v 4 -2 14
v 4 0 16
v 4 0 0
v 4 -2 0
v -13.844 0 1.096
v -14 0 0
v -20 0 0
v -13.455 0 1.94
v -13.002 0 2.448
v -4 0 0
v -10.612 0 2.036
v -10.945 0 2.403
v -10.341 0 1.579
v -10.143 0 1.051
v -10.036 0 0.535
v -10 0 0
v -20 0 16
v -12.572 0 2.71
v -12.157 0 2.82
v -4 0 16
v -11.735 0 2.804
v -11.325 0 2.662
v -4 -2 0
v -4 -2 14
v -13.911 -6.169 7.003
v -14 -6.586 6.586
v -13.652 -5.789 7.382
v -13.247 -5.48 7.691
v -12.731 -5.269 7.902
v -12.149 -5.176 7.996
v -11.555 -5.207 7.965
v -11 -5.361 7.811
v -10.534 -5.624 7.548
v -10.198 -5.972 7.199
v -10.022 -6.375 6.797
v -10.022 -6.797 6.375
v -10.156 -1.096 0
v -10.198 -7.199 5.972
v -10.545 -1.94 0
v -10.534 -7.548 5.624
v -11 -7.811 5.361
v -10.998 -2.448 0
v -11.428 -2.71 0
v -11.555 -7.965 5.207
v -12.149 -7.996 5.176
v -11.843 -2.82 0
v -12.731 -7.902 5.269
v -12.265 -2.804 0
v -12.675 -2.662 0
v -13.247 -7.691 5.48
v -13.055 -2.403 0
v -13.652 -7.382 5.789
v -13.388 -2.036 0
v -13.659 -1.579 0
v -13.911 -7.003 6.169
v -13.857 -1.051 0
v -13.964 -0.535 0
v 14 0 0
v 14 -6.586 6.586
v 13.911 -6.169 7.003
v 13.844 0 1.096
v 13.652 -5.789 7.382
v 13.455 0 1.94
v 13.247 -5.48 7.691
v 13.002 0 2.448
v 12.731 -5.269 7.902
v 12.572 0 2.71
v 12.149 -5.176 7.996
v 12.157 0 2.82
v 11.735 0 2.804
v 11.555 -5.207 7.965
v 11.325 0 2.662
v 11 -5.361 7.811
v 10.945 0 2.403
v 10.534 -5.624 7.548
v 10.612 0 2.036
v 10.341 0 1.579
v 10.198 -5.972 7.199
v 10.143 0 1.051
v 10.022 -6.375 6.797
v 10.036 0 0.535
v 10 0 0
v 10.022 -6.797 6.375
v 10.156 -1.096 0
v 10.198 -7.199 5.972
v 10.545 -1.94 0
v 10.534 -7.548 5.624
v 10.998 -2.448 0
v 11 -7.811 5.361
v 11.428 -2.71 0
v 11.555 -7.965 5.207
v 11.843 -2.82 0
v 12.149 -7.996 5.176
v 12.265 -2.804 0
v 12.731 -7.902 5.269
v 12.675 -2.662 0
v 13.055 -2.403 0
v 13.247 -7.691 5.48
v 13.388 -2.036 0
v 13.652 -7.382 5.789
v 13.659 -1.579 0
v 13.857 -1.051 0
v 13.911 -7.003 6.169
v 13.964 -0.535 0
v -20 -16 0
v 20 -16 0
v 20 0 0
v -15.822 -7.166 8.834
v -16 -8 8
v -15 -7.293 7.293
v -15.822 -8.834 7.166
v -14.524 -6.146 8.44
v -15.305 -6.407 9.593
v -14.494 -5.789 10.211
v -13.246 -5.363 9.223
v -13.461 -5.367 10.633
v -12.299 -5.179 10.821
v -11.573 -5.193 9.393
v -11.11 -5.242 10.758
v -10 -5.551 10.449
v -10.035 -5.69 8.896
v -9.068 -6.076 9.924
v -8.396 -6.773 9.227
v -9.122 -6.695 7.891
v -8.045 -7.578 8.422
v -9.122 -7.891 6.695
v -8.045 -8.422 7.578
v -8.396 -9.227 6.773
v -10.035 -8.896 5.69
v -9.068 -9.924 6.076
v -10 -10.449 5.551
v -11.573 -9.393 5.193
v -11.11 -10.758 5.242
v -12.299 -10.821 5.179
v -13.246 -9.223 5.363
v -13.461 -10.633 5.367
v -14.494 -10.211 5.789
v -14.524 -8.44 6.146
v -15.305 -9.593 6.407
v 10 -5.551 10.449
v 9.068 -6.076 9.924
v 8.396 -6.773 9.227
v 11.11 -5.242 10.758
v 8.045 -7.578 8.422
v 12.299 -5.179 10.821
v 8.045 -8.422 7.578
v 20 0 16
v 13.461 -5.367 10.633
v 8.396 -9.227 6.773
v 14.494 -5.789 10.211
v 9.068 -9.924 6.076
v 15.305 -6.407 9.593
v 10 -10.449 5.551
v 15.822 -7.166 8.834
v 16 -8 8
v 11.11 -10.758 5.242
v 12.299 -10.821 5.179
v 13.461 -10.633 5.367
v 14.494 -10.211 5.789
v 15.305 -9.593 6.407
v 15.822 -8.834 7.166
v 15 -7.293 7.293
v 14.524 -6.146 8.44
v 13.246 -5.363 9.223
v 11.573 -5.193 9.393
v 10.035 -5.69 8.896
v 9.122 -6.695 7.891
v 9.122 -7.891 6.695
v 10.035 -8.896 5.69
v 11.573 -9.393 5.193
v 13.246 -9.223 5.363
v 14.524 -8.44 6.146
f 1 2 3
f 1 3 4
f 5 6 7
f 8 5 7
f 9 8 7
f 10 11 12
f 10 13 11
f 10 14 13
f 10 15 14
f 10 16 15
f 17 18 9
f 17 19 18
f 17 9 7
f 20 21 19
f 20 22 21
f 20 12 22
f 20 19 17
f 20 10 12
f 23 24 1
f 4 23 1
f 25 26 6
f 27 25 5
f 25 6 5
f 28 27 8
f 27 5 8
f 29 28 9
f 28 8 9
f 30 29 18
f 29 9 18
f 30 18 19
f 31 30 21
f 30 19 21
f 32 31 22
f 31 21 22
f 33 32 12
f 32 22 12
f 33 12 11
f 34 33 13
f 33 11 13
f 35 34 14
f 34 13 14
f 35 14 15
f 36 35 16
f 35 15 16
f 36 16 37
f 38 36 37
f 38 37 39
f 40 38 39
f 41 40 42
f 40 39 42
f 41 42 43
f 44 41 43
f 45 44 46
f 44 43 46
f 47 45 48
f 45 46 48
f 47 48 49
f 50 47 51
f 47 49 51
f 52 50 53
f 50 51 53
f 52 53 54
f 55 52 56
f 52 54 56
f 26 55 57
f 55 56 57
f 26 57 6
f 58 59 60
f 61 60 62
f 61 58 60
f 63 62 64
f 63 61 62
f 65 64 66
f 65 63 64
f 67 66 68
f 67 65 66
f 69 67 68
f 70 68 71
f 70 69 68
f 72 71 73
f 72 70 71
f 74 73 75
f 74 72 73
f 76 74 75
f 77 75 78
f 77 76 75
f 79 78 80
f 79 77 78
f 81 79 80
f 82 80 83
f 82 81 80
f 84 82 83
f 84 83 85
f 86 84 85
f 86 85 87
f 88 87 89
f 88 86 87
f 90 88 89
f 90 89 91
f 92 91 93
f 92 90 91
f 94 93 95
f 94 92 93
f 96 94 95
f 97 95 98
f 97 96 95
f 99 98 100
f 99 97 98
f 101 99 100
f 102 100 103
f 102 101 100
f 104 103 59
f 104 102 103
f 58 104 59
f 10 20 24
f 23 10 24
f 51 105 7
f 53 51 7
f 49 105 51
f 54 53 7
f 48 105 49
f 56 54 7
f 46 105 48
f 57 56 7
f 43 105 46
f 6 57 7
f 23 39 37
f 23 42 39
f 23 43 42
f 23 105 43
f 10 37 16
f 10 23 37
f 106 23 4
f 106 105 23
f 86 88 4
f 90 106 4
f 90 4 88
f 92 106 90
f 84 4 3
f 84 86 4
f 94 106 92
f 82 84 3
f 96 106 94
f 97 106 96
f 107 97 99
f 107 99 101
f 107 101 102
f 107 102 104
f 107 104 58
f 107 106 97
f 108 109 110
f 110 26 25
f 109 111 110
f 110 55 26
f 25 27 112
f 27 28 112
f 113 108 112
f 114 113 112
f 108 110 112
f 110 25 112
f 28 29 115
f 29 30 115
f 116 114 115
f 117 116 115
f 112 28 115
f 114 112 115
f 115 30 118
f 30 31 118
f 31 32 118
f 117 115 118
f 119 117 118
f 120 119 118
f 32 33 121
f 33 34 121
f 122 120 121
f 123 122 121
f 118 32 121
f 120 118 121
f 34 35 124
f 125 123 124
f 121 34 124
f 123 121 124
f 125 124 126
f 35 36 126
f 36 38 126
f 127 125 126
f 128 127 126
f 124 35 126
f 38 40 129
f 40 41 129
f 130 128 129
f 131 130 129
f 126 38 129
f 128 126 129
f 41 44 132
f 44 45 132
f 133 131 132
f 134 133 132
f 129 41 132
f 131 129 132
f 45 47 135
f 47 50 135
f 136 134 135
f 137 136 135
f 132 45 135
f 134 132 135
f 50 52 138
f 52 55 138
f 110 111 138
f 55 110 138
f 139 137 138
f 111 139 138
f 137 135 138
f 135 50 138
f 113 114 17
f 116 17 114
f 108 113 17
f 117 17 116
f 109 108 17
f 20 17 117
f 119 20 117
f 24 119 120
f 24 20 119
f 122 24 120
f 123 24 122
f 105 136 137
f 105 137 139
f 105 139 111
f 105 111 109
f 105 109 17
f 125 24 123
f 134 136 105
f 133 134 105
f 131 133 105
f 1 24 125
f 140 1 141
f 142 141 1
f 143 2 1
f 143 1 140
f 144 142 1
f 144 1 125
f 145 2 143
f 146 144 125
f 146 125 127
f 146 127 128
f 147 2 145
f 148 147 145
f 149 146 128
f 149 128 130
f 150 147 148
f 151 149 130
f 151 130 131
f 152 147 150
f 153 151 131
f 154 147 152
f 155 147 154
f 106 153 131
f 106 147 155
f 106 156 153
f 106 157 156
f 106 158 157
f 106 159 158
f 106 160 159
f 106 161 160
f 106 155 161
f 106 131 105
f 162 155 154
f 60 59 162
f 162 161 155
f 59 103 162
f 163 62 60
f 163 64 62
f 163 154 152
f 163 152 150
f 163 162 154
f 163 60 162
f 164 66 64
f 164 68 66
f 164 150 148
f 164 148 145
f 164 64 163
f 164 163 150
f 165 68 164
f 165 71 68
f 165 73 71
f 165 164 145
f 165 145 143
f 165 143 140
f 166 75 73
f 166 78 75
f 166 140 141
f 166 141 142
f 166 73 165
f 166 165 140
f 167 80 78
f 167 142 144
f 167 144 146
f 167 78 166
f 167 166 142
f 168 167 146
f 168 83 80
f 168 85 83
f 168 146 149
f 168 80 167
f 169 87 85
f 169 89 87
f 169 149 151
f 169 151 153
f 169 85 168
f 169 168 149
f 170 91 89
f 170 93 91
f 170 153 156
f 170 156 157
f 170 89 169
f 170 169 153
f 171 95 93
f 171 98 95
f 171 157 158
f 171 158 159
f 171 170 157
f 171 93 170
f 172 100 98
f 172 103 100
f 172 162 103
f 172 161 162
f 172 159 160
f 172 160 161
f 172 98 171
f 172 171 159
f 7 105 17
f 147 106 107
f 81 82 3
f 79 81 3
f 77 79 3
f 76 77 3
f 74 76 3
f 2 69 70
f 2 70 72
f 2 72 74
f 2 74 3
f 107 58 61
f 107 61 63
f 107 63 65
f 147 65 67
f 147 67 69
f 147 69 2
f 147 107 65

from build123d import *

# Parameters (mm, degrees)
F2_DEPTH       = 20
F4_D           = 4
F4_CSINK_D     = 8
F4_CSINK_ANGLE = 90
F6_W           = 8
F6_H           = 2
F7_DEPTH       = 16.001


with BuildPart() as f2:
    # F1 (on Right) → F2 (new body, symmetric)
    with BuildSketch(Plane.YZ):
        Polygon((-16, 0), (0, 0), (0, 16), align=None)
    extrude(amount=F2_DEPTH, both=True)

    # F4 (through all)
    with Locations(Plane(origin=(0, -8, 8), x_dir=(1, 0, 0), z_dir=(0, -0.7071067812, 0.7071067812))):
        with Locations((-12, 0)):
            CounterSinkHole(F4_D / 2, F4_CSINK_D / 2, counter_sink_angle=F4_CSINK_ANGLE)

    # F5: F2 across plane


with BuildPart() as f2_1:
    add(f2.part)
    add(f2.part.mirror(Plane.YZ), mode=Mode.INTERSECT)

    # F6 (on face) → F7 (cut, through all)
    with BuildSketch(Plane(origin=(0, 0, 0), x_dir=(1, 0, 0), z_dir=(0, 0, -1))):
        with Locations((0, 1)):
            Rectangle(F6_W, F6_H)
    extrude(amount=-F7_DEPTH, mode=Mode.SUBTRACT)


solid = f2_1.part
